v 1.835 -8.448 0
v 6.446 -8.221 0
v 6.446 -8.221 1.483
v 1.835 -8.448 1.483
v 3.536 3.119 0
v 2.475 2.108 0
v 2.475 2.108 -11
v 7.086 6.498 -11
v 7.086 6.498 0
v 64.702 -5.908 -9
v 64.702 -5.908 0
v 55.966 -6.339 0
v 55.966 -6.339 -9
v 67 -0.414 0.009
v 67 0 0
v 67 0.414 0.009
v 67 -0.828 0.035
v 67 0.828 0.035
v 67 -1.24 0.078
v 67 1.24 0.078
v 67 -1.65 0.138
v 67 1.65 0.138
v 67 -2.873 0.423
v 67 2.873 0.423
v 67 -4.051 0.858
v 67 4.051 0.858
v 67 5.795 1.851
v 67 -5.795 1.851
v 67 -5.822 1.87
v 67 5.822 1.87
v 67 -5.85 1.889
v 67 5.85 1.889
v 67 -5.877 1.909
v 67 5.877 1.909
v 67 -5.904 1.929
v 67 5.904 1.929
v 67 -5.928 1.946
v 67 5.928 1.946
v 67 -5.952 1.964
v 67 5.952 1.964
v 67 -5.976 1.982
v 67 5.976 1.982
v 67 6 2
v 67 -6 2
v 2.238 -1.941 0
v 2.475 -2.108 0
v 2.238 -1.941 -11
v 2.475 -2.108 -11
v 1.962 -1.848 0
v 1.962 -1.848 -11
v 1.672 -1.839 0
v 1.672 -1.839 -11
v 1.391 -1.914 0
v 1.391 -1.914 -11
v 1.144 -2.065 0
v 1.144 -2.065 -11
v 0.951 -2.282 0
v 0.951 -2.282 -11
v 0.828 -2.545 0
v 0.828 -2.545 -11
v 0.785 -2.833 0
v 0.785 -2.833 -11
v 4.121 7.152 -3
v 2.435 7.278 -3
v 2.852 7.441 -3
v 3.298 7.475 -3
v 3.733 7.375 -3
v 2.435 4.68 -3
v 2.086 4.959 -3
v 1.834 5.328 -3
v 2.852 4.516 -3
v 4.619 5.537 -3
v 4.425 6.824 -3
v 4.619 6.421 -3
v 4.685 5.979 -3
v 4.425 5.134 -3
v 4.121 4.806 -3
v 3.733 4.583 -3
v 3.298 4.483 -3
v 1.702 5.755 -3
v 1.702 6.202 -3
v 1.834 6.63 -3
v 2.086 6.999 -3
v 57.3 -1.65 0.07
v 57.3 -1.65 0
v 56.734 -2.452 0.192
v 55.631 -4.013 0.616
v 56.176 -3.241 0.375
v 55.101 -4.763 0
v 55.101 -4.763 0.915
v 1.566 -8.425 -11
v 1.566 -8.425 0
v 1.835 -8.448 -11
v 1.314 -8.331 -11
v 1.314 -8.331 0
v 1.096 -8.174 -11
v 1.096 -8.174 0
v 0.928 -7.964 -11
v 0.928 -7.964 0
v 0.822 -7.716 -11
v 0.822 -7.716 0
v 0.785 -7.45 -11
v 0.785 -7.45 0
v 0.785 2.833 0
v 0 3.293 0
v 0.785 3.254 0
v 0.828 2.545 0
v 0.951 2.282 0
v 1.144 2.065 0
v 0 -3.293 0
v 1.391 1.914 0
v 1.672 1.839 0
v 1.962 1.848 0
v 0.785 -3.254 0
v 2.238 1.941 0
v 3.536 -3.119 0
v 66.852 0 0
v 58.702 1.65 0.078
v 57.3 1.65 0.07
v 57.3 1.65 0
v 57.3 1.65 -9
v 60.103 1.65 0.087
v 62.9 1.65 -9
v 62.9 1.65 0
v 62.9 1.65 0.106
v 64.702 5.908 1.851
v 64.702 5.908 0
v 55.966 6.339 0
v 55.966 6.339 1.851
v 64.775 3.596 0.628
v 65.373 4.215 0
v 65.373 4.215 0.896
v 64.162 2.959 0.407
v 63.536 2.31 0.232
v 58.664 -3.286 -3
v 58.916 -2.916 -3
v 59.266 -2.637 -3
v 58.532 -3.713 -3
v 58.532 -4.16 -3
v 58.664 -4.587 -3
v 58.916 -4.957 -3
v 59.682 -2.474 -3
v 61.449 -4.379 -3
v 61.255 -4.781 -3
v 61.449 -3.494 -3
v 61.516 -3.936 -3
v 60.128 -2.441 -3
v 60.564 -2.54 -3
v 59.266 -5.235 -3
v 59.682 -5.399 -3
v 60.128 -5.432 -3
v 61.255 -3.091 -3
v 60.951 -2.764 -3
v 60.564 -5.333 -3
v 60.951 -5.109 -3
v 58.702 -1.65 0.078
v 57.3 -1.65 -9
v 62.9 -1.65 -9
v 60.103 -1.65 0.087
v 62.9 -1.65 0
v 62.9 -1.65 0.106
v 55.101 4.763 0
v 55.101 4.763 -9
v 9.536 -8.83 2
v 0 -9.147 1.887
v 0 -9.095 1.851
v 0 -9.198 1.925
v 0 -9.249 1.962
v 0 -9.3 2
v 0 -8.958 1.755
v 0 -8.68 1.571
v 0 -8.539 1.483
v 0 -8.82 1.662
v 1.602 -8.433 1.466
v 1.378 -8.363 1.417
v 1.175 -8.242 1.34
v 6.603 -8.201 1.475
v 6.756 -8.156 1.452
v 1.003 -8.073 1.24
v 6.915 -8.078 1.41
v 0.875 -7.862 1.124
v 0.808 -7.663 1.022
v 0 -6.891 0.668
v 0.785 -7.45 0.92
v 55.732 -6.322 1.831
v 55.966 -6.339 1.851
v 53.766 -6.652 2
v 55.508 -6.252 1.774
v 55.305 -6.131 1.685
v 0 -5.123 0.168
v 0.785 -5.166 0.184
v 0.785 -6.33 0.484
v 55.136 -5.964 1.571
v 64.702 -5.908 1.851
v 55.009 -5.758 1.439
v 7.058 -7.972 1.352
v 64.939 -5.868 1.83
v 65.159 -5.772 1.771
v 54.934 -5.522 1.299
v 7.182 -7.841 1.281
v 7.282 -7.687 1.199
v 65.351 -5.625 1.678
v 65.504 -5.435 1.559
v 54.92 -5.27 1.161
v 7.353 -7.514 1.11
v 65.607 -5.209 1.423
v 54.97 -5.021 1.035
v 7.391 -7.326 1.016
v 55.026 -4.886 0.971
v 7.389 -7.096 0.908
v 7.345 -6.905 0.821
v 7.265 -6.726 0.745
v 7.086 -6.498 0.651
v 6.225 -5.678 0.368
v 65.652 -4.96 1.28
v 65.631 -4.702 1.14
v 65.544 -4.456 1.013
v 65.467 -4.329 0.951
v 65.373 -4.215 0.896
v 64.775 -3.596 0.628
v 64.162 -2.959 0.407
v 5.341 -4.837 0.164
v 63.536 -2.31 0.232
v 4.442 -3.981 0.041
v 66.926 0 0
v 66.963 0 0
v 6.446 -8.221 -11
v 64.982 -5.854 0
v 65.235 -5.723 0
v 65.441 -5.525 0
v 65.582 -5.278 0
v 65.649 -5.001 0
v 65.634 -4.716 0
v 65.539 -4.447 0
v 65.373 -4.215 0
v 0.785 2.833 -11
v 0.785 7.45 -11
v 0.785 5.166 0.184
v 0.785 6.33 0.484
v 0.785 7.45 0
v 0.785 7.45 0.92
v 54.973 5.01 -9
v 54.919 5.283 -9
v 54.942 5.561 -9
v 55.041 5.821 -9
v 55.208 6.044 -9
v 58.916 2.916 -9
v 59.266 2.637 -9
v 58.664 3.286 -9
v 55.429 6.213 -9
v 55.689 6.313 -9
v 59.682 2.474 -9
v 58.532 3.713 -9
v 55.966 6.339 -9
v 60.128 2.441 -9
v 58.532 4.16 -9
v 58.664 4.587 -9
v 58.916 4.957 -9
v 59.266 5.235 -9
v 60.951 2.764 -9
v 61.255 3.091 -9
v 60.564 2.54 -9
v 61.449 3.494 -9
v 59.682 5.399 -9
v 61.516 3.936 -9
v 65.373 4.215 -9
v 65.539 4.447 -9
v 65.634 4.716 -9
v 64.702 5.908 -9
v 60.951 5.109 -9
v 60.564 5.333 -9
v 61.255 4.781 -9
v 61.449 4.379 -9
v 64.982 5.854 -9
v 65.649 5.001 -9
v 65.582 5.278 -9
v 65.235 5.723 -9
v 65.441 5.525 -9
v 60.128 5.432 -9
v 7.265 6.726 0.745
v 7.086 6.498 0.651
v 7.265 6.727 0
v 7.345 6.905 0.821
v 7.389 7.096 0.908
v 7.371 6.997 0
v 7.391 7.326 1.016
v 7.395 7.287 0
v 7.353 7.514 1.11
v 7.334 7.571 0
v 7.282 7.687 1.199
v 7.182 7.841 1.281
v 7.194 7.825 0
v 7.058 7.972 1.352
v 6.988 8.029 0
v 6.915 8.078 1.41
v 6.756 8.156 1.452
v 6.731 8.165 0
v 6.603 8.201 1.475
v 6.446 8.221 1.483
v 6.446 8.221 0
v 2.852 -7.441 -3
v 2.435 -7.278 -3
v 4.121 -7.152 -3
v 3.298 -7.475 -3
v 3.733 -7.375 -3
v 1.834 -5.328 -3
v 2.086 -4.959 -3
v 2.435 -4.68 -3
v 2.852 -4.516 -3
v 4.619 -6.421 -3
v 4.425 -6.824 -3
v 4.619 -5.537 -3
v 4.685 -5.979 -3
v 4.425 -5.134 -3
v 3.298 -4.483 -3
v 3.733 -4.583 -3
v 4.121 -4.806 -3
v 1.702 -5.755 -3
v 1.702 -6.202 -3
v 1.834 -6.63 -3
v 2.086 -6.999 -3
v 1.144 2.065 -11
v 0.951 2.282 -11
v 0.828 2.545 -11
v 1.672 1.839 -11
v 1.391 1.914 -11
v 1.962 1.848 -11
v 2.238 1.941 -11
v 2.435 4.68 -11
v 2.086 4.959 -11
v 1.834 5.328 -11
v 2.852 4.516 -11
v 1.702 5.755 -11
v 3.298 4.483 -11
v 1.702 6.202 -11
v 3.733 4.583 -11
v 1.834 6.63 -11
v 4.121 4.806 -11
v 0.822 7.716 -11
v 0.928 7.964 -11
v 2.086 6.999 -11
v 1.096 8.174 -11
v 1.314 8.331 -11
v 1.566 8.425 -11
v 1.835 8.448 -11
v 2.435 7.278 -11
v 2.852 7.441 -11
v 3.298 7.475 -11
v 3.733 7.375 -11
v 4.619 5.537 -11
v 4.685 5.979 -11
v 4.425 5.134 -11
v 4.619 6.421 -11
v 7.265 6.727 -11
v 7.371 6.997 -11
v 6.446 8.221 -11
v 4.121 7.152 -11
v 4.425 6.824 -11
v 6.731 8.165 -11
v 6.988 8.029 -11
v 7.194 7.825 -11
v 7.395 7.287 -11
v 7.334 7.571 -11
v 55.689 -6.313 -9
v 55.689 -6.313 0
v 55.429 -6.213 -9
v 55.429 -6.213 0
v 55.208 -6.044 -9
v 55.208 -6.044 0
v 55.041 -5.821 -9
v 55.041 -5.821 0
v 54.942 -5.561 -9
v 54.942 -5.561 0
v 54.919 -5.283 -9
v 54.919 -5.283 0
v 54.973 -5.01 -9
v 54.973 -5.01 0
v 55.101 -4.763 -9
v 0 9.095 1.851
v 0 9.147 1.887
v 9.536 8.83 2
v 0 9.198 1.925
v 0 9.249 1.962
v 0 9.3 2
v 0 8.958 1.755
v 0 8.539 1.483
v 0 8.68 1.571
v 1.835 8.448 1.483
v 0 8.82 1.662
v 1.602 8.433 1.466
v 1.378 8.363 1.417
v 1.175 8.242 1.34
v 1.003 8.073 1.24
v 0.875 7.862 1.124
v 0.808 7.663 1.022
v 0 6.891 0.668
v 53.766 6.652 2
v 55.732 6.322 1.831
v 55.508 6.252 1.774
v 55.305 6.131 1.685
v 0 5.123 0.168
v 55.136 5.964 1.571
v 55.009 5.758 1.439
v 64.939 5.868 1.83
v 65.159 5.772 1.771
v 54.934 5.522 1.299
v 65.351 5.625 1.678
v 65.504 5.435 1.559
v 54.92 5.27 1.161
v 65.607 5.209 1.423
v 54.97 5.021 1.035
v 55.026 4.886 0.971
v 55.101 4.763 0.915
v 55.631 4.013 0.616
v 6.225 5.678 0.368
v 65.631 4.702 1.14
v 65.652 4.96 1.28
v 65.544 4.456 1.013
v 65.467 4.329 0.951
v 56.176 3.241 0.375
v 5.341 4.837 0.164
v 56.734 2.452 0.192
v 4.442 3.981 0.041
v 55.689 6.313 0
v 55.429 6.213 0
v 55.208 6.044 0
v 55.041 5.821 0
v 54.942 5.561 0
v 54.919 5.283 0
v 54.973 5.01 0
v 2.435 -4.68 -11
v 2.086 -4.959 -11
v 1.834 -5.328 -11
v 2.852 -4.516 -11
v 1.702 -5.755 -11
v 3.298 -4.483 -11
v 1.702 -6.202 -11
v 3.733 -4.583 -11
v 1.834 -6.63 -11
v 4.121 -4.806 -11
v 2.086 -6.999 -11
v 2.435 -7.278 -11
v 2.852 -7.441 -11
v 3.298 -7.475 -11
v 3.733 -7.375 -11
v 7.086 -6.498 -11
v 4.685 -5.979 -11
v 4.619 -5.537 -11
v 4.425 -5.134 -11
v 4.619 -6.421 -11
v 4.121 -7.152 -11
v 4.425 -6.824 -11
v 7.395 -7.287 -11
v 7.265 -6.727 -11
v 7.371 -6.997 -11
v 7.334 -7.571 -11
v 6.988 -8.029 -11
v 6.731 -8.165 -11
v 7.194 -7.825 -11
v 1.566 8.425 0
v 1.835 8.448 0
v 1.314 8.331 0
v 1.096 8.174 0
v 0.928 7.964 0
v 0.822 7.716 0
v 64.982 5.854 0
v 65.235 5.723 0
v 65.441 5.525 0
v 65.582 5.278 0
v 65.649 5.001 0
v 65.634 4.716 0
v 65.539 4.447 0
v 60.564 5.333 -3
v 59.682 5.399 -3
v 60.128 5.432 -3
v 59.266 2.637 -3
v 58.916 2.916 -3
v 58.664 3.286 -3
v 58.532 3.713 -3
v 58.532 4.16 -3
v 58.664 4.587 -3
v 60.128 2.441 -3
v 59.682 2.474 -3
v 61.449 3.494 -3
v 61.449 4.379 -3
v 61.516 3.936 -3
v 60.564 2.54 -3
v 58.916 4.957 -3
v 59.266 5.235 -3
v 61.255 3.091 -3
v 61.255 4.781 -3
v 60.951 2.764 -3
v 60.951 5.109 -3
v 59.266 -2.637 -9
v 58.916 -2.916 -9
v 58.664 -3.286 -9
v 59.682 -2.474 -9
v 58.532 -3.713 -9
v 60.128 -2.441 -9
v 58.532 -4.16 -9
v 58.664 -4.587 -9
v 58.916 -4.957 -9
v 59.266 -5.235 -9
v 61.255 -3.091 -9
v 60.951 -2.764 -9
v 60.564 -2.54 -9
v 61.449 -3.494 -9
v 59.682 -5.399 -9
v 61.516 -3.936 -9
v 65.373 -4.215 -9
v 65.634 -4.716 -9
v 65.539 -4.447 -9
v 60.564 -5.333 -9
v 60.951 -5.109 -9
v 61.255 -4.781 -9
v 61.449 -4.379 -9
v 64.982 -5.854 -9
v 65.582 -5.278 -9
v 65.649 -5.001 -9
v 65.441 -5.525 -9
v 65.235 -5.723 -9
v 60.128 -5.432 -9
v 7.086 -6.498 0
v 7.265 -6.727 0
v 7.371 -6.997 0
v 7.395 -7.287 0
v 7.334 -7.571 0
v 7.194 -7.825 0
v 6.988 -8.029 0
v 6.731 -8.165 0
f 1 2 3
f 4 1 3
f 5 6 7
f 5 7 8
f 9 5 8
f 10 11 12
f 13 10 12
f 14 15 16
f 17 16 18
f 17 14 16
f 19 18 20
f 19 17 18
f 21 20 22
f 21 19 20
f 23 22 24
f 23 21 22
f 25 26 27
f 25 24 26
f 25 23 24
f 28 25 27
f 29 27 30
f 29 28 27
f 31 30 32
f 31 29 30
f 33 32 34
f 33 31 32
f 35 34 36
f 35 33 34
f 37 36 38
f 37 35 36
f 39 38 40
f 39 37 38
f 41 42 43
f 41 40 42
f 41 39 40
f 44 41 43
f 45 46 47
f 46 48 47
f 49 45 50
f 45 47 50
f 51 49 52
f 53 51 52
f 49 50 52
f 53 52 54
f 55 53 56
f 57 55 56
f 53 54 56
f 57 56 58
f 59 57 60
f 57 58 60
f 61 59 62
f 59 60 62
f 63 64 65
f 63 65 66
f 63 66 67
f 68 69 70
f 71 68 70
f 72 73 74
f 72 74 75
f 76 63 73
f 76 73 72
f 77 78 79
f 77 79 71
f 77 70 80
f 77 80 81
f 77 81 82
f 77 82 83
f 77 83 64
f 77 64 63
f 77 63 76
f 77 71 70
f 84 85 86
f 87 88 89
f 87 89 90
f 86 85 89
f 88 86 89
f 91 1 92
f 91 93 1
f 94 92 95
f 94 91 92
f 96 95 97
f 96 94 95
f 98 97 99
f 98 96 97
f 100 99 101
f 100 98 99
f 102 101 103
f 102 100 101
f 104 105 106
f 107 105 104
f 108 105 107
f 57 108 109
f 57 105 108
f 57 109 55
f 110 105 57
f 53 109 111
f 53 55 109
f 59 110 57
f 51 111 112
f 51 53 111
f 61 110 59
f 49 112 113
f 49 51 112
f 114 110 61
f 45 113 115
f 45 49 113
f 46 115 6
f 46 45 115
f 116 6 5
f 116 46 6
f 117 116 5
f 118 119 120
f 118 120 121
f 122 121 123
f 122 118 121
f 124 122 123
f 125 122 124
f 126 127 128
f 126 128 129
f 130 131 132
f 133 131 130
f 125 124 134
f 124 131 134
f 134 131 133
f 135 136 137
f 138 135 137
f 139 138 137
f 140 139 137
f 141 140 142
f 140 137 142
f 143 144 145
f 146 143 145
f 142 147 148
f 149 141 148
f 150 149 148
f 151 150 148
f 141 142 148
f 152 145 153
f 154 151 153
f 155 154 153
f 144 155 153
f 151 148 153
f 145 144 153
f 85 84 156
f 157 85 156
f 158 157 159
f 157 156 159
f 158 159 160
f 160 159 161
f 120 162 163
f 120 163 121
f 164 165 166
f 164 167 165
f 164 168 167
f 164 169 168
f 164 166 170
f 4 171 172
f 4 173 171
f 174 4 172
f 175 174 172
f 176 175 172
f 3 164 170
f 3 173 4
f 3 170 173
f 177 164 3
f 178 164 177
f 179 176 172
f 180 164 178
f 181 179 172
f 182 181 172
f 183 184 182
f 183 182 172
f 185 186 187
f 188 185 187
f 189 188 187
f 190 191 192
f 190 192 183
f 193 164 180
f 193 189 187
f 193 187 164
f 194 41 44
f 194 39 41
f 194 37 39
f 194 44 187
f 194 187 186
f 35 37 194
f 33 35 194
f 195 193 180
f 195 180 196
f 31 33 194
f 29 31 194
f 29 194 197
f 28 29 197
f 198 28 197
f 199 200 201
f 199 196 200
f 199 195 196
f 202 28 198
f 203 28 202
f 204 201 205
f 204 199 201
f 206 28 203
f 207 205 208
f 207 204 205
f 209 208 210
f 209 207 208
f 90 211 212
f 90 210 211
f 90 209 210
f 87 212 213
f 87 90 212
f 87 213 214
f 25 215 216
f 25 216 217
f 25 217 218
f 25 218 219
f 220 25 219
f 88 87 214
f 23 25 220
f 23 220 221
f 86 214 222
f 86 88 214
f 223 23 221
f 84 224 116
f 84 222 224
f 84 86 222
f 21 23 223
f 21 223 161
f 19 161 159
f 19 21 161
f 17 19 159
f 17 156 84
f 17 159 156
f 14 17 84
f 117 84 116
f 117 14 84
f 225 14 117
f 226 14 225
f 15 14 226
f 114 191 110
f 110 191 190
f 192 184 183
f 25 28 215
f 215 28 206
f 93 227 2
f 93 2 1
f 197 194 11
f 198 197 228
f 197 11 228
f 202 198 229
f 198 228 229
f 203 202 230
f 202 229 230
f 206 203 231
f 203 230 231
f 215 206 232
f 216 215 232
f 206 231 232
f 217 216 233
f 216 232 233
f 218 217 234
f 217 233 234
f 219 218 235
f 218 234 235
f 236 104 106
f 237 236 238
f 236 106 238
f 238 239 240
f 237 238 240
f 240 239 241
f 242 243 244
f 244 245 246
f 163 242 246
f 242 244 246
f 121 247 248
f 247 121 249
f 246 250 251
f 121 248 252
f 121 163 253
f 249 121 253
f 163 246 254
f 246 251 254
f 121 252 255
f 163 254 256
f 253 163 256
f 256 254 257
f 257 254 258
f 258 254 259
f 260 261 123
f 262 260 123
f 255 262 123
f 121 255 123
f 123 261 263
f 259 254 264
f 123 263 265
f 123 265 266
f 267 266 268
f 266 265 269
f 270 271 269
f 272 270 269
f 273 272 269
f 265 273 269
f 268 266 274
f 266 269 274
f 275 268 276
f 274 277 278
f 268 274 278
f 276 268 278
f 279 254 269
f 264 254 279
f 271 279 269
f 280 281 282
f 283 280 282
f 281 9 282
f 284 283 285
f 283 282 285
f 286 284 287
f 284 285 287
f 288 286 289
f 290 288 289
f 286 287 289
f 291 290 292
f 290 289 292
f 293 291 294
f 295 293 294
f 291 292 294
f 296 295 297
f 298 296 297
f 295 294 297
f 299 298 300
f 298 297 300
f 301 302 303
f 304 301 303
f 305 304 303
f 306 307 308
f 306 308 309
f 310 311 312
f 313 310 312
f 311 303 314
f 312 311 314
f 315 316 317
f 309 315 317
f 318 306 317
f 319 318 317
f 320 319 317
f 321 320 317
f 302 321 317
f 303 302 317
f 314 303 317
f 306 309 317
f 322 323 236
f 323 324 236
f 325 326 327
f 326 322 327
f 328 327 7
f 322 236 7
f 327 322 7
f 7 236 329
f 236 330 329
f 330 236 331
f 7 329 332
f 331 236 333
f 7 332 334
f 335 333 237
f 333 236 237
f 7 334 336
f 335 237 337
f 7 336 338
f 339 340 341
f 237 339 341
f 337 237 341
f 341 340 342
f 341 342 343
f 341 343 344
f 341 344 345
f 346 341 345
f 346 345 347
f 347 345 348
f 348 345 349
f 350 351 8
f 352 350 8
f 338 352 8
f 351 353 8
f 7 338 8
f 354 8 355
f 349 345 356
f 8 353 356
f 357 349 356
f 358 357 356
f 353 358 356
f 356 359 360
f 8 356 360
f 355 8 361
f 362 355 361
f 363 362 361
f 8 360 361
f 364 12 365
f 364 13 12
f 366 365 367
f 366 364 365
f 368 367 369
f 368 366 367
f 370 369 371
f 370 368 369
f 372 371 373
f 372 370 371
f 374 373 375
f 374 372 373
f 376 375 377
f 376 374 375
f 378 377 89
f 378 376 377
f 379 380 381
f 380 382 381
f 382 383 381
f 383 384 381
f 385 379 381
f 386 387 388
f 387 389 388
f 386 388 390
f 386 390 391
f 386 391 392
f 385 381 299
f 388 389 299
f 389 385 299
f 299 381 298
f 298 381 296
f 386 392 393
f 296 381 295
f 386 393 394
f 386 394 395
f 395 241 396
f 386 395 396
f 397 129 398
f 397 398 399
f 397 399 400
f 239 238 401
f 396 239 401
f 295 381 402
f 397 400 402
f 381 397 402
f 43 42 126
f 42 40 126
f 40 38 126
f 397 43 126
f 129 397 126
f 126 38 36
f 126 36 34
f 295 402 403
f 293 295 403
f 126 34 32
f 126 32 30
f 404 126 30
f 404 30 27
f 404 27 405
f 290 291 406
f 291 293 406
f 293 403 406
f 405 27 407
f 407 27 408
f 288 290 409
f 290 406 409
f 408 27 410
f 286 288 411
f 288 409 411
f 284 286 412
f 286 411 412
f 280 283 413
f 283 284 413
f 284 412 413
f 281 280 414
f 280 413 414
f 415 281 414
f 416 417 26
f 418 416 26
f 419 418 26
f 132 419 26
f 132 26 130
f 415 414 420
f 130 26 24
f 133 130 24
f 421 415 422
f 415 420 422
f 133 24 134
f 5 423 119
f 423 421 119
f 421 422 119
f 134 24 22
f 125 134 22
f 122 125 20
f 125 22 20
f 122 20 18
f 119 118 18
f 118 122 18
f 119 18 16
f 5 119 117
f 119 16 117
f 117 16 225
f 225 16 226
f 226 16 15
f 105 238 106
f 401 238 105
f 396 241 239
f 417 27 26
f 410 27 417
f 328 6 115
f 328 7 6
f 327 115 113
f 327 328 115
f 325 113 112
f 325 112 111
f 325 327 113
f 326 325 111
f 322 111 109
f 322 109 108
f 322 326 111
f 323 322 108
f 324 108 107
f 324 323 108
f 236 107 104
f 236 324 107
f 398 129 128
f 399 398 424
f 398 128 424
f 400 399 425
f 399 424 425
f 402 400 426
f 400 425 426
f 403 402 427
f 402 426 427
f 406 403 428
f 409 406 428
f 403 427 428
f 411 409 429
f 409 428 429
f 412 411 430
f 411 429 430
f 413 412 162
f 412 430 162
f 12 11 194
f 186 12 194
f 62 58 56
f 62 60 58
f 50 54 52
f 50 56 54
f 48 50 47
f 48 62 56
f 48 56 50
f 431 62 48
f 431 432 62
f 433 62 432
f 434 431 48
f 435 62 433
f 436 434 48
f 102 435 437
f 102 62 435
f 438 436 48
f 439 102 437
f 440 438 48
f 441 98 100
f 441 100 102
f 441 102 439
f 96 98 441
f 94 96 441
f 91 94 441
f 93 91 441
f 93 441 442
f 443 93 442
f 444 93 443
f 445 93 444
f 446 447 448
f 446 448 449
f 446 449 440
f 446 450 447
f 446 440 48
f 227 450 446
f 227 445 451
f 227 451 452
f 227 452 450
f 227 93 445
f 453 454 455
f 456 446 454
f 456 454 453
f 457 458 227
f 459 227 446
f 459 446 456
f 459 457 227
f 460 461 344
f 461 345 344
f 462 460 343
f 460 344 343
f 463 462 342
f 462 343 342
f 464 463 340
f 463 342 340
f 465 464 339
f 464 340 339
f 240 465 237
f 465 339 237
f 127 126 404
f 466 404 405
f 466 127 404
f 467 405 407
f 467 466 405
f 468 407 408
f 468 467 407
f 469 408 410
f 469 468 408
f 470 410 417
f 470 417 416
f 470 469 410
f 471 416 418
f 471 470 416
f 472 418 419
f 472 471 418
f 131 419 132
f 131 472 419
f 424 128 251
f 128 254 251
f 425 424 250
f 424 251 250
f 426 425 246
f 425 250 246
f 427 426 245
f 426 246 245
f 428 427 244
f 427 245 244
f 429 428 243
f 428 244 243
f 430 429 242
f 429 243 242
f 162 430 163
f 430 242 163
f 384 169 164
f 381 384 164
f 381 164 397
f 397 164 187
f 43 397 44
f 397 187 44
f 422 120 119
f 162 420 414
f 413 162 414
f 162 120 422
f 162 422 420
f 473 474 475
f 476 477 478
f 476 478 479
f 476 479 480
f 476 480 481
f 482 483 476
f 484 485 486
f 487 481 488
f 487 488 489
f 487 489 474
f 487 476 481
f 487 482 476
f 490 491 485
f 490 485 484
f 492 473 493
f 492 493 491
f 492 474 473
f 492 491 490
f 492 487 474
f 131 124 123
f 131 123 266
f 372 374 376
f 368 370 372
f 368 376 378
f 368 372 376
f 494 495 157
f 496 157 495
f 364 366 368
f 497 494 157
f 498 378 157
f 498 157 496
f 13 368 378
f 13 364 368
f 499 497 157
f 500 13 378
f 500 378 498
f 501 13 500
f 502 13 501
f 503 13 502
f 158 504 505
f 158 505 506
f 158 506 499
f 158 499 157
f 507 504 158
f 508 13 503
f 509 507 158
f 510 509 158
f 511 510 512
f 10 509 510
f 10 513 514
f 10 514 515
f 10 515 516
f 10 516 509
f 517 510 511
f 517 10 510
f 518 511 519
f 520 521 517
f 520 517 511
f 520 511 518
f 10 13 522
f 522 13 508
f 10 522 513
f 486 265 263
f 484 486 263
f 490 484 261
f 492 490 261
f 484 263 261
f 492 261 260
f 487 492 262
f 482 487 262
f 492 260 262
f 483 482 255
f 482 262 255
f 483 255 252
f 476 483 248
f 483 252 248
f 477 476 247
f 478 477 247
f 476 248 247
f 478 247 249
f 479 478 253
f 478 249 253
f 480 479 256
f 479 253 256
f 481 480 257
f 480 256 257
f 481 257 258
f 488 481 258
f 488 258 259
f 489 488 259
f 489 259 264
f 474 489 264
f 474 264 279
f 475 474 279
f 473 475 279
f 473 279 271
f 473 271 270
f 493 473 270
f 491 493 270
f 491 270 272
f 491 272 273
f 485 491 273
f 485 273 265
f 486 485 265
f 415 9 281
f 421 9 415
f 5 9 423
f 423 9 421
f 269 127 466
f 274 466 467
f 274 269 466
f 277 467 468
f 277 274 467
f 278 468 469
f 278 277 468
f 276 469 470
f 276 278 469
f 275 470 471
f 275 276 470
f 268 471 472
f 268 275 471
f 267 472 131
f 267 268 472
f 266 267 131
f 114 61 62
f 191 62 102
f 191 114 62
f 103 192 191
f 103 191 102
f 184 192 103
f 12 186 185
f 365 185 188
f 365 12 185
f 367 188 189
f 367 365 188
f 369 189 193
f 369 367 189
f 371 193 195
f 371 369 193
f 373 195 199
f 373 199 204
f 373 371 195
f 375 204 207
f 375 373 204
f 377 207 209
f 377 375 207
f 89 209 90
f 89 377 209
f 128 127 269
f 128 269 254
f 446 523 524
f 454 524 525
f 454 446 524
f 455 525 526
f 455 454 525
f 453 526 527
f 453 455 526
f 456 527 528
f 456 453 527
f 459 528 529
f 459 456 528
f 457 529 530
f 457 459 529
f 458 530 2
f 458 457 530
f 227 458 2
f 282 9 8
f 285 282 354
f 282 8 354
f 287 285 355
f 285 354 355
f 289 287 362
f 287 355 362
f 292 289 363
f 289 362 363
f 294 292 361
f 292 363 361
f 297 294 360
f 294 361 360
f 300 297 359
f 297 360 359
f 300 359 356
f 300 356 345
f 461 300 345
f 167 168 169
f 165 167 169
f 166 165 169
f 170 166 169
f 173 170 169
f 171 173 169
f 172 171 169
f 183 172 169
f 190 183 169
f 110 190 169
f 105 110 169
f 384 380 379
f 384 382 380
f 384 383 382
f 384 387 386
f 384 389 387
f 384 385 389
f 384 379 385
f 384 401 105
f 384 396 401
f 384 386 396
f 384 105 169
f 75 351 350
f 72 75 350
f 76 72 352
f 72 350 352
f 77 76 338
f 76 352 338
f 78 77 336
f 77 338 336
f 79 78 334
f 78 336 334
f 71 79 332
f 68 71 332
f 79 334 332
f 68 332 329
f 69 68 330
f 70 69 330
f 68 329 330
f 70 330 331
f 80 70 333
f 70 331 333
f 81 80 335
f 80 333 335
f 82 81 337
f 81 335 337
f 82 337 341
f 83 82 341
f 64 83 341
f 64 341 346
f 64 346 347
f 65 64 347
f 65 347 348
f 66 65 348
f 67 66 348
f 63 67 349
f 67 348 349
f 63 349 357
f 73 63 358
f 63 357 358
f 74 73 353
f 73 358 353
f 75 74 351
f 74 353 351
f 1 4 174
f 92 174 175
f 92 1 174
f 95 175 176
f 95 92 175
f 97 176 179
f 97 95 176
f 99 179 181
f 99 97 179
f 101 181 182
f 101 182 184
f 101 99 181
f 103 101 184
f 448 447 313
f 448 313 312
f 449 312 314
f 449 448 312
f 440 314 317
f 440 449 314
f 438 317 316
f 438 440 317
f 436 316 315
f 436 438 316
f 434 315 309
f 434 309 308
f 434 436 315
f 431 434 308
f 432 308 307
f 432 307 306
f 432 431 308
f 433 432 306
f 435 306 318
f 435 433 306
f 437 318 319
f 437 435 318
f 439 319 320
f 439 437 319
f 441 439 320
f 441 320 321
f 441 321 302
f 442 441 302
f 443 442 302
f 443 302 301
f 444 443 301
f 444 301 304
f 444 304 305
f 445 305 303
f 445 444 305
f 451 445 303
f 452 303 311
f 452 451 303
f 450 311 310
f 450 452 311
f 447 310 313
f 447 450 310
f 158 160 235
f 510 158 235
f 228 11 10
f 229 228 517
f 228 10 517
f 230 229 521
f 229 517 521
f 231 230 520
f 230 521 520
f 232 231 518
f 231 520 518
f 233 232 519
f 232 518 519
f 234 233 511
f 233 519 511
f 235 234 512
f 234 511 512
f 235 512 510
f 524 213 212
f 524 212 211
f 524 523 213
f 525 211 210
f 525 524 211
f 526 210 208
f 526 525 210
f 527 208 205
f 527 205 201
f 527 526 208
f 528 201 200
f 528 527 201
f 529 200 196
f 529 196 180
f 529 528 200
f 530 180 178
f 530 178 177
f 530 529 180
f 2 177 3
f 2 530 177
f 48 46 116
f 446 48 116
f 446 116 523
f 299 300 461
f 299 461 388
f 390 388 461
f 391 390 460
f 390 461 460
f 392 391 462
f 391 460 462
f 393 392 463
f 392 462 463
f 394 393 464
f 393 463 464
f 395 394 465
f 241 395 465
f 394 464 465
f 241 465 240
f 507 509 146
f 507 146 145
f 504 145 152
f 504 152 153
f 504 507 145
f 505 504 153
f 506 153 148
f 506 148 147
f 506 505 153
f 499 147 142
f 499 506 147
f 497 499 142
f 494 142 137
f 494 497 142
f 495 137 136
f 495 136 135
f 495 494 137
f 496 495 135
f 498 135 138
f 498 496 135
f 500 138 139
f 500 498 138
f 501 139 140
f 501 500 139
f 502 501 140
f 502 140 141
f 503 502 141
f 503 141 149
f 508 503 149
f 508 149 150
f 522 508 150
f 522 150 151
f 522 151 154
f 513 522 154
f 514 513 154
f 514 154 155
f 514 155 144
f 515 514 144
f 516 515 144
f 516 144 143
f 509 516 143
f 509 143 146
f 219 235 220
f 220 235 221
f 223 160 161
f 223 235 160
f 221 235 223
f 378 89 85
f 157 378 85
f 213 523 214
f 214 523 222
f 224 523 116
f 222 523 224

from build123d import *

# Parameters (mm, degrees)
F1_DEPTH     = 2
F3_DEPTH     = 13
F4_DEPTH     = 11
F5_R         = 1.5
F6_DEPTH     = 8
F7_T4_DEPTH  = 97.0812194284
F7_T9_DEPTH  = 97.0812194284
F7_T14_DEPTH = 97.0812194284
F7_T20_DEPTH = 97.0812194284
F7_T25_DEPTH = 97.0812194284
F7_T31_DEPTH = 97.0812194284
F8_R         = 1


# Not quite as in the source:
# - a fillet or chamfer that OpenCascade refuses, or shapes differently, is made with other operations: its cross-section is extruded or revolved along the edge and cut away or added


with BuildPart() as f1:
    # F0 (on Top) → F1 (new body)
    with BuildSketch(Plane.XY):
        Polygon((0, 9.3), (0, 0), (67, 0), (67, 6), align=None)
    extrude(amount=F1_DEPTH)

    # F2 (on face) → F3 (join)
    with BuildSketch(Plane.XY.offset(2)):
        Polygon((0.7854075007, 8.5), (0.7854075007, 0.5), (8.7757214003, 8.1064472258), align=None)
    extrude(amount=-F3_DEPTH)

    # F2 (on face) → F4 (join)
    with BuildSketch(Plane.XY.offset(2)):
        Polygon((62.9, 1.65), (66.9, 5.8), (53.9157399132, 6.439523258), (57.3, 1.65), align=None)
    extrude(amount=-F4_DEPTH)

    # F5 (on face) → F6 (cut)
    with BuildSketch(Plane(origin=(0, 0, -11), x_dir=(1, 0, 0), z_dir=(0, 0, -1))):
        with Locations((3.1854075007, -5.9788816921)):
            Circle(F5_R)
        with Locations((60.0157399132, -3.9364085902)):
            Circle(F5_R)
    extrude(amount=-F6_DEPTH, mode=Mode.SUBTRACT)

    # F7: fillet of radius 10 on 1 edges, made by hand


with BuildPart() as f7_tool2:
    # F7_s3 → F7_t4 (new body)
    with BuildSketch(Plane(origin=(81.5248873918, -4.0154049014, 0), x_dir=(0, 0, 1), z_dir=(-0.9987892374, 0.0491940968, 0))):
        with BuildLine():
            ThreePointArc((2, 9.2887399083), (0.5131670195, 6.4510175684), (0, 3.2887399083))
            Line((0, 3.2887399083), (0, 9.2887399083))
            Line((0, 9.2887399083), (2, 9.2887399083))
        make_face()
    extrude(amount=F7_T4_DEPTH)

    split(bisect_by=Plane(origin=(0.4468822571, 9.0730640082, 0), x_dir=(0, 0, 1), z_dir=(0.0491940968, 0.9987892374, 0)), keep=Keep.TOP)


with BuildPart() as f1_1:
    add(f1.part)

    # F7_t1: cut F7_tool2
    add(f7_tool2.part, mode=Mode.SUBTRACT)


with BuildPart() as f7_tool7:
    # F7_s8 → F7_t9 (new body)
    with BuildSketch(Plane(origin=(81.5248873918, -4.0154049014, 0), x_dir=(0, 0, 1), z_dir=(-0.9987892374, 0.0491940968, 0))):
        with BuildLine():
            ThreePointArc((2, 9.2887399083), (0.5131670195, 6.4510175684), (0, 3.2887399083))
            Line((0, 3.2887399083), (0, 9.2887399083))
            Line((0, 9.2887399083), (2, 9.2887399083))
        make_face()
    extrude(amount=F7_T9_DEPTH)

    split(bisect_by=Plane(origin=(31.7828354278, -30.6340582437, 0), x_dir=(0, 0, 1), z_dir=(0.7199990803, -0.6939750171, 0)), keep=Keep.TOP)


with BuildPart() as f1_2:
    add(f1_1.part)

    # F7_t6: cut F7_tool7
    add(f7_tool7.part, mode=Mode.SUBTRACT)


with BuildPart() as f7_tool12:
    # F7_s13 → F7_t14 (new body)
    with BuildSketch(Plane(origin=(81.5248873918, -4.0154049014, 0), x_dir=(0, 0, 1), z_dir=(-0.9987892374, 0.0491940968, 0))):
        with BuildLine():
            ThreePointArc((2, 9.2887399083), (0.5131670195, 6.4510175684), (0, 3.2887399083))
            Line((0, 3.2887399083), (0, 9.2887399083))
            Line((0, 9.2887399083), (2, 9.2887399083))
        make_face()
    extrude(amount=F7_T14_DEPTH)

    split(bisect_by=Plane(origin=(38.996012386, 27.554443554, 0), x_dir=(0, 0, 1), z_dir=(-0.816693011, -0.5770723748, 0)), keep=Keep.TOP)

    split(bisect_by=Plane(origin=(0.1236877347, -0.1299297552, 0), x_dir=(0, 0, 1), z_dir=(0.6894947075, -0.7242907209, 0)), keep=Keep.TOP)


with BuildPart() as f1_3:
    add(f1_2.part)

    # F7_t11: cut F7_tool12
    add(f7_tool12.part, mode=Mode.SUBTRACT)


with BuildPart() as f7_tool18:
    # F7_s19 → F7_t20 (new body)
    with BuildSketch(Plane(origin=(81.5248873918, -4.0154049014, 0), x_dir=(0, 0, 1), z_dir=(-0.9987892374, 0.0491940968, 0))):
        with BuildLine():
            ThreePointArc((2, 9.2887399083), (0.5131670195, 6.4510175684), (0, 3.2887399083))
            Line((0, 3.2887399083), (0, 9.2887399083))
            Line((0, 9.2887399083), (2, 9.2887399083))
        make_face()
    extrude(amount=F7_T20_DEPTH)

    split(bisect_by=Plane.XZ.offset(-1.65), keep=Keep.TOP)


with BuildPart() as f1_4:
    add(f1_3.part)

    # F7_t17: cut F7_tool18
    add(f7_tool18.part, mode=Mode.SUBTRACT)


with BuildPart() as f7_tool23:
    # F7_s24 → F7_t25 (new body)
    with BuildSketch(Plane(origin=(81.5248873918, -4.0154049014, 0), x_dir=(0, 0, 1), z_dir=(-0.9987892374, 0.0491940968, 0))):
        with BuildLine():
            ThreePointArc((2, 9.2887399083), (0.5131670195, 6.4510175684), (0, 3.2887399083))
            Line((0, 3.2887399083), (0, 9.2887399083))
            Line((0, 9.2887399083), (2, 9.2887399083))
        make_face()
    extrude(amount=F7_T25_DEPTH)

    split(bisect_by=Plane(origin=(0.419544275, 8.518020129, 0), x_dir=(0, 0, 1), z_dir=(0.0491940968, 0.9987892374, 0)), keep=Keep.TOP)

    split(bisect_by=Plane(origin=(0.1236877347, -0.1299297552, 0), x_dir=(0, 0, 1), z_dir=(-0.6894947075, 0.7242907209, 0)), keep=Keep.TOP)


with BuildPart() as f1_5:
    add(f1_4.part)

    # F7_t22: cut F7_tool23
    add(f7_tool23.part, mode=Mode.SUBTRACT)


with BuildPart() as f7_tool29:
    # F7_s30 → F7_t31 (new body)
    with BuildSketch(Plane(origin=(81.5248873918, -4.0154049014, 0), x_dir=(0, 0, 1), z_dir=(-0.9987892374, 0.0491940968, 0))):
        with BuildLine():
            ThreePointArc((2, 9.2887399083), (0.5131670195, 6.4510175684), (0, 3.2887399083))
            Line((0, 3.2887399083), (0, 9.2887399083))
            Line((0, 9.2887399083), (2, 9.2887399083))
        make_face()
    extrude(amount=F7_T31_DEPTH)

    split(bisect_by=Plane.YZ.offset(0.7854075007), keep=Keep.BOTTOM)


with BuildPart() as f1_6:
    add(f1_5.part)

    # F7_t28: cut F7_tool29
    add(f7_tool29.part, mode=Mode.SUBTRACT)

    # F8
    f8_edges = [f1_6.edges().sort_by_distance(p)[0] for p in [
        (0.785408, 8.5, -4.758713),
        (8.775721, 8.106447, -4.758713),
        (0.785408, 0.5, -5.5),
        (66.9, 5.8, -3.574746),
        (53.91574, 6.439523, -3.574746),
    ]]
    fillet(f8_edges, radius=F8_R)

    # F9: F1 across plane


with BuildPart() as f1_7:
    add(f1_6.part)
    add(f1_6.part.mirror(Plane.XZ))


solid = f1_7.part
